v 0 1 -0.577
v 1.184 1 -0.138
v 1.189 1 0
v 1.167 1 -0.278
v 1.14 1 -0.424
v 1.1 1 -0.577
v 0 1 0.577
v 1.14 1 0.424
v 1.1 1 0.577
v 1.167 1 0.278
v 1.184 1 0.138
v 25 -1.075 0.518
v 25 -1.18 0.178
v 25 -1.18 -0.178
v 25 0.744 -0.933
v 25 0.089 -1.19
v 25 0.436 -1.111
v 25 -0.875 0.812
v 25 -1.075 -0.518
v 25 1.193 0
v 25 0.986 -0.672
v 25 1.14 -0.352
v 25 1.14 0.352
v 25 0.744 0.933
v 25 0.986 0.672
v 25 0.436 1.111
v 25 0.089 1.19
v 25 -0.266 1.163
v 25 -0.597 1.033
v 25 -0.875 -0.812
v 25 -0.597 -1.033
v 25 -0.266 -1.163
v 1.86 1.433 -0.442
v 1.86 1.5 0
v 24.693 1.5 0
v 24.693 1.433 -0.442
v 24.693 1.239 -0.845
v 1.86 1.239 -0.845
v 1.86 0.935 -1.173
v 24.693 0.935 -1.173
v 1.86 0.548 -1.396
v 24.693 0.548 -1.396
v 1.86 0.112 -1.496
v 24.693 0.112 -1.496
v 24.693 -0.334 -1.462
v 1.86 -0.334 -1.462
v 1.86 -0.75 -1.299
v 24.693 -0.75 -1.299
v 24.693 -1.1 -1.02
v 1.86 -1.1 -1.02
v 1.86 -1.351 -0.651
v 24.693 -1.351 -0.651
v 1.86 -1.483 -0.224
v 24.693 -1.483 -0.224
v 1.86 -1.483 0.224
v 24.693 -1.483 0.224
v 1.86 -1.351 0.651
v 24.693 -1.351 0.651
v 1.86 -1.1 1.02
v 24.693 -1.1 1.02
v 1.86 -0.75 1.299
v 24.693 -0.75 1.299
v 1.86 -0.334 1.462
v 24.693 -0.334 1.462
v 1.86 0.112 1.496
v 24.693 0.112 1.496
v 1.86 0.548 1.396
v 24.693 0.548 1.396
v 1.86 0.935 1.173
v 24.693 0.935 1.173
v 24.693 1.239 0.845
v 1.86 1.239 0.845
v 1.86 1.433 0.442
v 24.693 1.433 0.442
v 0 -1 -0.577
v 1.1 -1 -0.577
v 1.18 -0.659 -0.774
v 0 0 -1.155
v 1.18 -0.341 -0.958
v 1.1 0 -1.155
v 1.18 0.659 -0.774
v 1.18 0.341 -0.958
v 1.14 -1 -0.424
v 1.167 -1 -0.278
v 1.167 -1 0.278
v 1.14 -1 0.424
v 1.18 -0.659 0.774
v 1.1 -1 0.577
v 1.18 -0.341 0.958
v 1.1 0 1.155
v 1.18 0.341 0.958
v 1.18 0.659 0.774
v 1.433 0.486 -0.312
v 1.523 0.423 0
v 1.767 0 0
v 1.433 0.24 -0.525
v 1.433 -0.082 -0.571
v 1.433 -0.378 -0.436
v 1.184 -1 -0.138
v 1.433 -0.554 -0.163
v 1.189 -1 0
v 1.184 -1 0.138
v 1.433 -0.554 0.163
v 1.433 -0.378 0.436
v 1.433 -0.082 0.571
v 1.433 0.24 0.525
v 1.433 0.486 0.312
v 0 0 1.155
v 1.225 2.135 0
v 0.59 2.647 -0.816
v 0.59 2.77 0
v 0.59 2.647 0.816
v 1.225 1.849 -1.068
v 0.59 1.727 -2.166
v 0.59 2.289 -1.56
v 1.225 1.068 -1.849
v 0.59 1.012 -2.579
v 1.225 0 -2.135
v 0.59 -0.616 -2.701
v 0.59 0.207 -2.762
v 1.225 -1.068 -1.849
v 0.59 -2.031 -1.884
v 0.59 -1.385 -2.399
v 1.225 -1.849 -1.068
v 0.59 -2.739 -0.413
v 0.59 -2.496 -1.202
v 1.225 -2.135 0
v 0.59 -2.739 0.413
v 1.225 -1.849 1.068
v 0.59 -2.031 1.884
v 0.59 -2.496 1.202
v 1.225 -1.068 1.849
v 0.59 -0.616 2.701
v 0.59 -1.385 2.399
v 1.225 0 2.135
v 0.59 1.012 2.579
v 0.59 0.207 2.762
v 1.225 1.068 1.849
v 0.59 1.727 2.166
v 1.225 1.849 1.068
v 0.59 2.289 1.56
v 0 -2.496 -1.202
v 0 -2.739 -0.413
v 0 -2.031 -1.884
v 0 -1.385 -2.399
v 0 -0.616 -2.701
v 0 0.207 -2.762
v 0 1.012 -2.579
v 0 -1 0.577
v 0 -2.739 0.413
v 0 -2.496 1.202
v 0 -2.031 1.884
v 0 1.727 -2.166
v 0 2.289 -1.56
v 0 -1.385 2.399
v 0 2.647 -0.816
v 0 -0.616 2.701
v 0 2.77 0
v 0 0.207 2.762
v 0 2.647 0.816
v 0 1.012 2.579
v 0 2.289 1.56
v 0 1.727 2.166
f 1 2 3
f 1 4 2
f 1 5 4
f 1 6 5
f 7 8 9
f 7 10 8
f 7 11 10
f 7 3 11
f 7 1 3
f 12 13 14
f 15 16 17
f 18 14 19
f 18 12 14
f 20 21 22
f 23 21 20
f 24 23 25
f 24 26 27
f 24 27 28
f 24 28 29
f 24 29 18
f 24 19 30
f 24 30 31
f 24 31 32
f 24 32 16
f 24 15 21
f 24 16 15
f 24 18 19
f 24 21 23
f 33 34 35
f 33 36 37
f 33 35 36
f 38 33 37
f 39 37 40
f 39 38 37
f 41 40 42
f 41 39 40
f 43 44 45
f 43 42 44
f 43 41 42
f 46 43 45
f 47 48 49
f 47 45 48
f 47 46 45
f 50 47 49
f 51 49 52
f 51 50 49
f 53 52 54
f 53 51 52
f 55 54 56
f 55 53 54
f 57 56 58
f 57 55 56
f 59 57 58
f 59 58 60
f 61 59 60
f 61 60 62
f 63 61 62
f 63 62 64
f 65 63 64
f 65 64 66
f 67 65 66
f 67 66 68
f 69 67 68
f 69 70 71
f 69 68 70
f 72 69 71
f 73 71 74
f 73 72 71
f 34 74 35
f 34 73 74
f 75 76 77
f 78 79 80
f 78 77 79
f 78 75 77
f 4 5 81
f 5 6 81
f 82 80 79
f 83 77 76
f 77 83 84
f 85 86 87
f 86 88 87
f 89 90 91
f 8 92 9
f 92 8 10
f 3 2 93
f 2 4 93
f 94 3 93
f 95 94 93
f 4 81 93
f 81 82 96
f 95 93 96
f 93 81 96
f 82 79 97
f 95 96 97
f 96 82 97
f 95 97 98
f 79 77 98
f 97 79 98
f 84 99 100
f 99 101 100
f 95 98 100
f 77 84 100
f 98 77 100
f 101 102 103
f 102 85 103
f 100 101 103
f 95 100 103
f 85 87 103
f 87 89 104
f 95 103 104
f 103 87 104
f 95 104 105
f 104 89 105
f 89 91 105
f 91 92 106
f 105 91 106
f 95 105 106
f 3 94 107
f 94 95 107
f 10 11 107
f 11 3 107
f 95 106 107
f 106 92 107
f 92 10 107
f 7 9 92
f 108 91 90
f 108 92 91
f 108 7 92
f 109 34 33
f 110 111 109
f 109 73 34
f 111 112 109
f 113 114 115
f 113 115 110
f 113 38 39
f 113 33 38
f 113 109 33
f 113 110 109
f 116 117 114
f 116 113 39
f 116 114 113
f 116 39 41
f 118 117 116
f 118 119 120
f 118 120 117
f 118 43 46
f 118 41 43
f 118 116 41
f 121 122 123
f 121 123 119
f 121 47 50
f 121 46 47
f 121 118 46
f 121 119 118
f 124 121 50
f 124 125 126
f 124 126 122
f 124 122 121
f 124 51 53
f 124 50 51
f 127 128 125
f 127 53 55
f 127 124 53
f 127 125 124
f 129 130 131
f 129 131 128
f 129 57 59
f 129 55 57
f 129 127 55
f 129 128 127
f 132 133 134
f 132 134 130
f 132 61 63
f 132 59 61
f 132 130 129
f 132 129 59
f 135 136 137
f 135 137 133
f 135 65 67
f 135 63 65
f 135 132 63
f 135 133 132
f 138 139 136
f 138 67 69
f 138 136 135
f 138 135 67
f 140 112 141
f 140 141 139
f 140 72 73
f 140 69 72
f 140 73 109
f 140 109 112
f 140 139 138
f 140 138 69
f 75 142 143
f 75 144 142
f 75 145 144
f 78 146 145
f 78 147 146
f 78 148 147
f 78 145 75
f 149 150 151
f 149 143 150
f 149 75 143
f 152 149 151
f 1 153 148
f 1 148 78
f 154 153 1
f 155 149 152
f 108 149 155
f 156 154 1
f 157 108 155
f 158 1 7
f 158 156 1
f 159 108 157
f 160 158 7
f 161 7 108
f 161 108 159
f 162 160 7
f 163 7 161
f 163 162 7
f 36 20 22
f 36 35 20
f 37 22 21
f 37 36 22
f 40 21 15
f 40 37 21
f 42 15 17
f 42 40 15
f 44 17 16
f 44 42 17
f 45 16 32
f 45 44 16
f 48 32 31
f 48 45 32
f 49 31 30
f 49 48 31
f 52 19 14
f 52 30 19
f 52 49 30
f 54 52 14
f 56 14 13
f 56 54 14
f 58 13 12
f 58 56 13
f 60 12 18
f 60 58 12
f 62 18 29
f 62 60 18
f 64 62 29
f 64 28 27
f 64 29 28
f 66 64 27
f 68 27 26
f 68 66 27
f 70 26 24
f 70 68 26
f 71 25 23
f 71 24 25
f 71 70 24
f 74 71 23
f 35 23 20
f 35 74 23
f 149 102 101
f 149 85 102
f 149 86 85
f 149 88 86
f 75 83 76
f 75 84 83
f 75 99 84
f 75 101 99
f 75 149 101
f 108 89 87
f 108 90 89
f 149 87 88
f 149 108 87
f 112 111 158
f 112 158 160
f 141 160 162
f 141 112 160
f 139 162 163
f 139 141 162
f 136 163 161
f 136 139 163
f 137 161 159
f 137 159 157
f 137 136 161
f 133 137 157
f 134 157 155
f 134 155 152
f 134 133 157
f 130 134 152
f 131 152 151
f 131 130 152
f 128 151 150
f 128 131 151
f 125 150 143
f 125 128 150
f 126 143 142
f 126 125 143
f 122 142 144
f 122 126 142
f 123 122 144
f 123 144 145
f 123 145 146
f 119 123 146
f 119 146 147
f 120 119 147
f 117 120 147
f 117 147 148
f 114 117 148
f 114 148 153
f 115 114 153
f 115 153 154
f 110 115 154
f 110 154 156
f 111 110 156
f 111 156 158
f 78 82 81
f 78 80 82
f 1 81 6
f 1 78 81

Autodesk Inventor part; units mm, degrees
ref_plane "YZ Plane" through (0, 0, 0) normal (1, 0, 0) x (0, 1, 0)
ref_plane "XZ Plane" through (0, 0, 0) normal (0, 1, 0) x (-1, 0, 0)
sketch "Sketch1" plane through (0, 0, 0) normal (0, 0, 1) x (1, 0, 0)
  line L0 (25, 0) -> (25, 1.5)
  line L1 (25, 1.5) -> (3.36, 1.5)
  line L2 (3.36, 1.5) -> (3.0533, 1.5)
  line L3 (0, 2.77) -> (0, 1.1547)
  line L4 (0, 1.1547) -> (1.1, 1.1547)
  line L5 (1.1, 1.1547) -> (1.7667, 0)
  line L6 (1.7667, 0) -> (25, 0)
  line L7 (0, 2.77) -> (0.59, 2.77)
  line L8 (0.59, 2.77) -> (1.86, 1.5)
  line L9 (3.0533, 1.5) -> (1.86, 1.5)
  line L10 (3.36, 1.5) -> (1.86, 1.5) construction
  line L11 (1.86, 1.5) -> (1.86, 1.5)
  line L12 (-25.4, 0) -> (152.4, 0) projected
  line L13 (0, -2.1133) -> (0, 12.6797) projected
  dimension "d0" = 25
  dimension "d1" = 21.64
  dimension "d2" = 1.1
  dimension "d3" = 3
  dimension "d6" = 1.86
  dimension "d7" = 45
  dimension "d8" = 2.3094
  dimension "d9" = 60
  dimension "d10" = 5.54
  dimension "d11" = 3
  dimension "d12" = 0.3067
revolve "Body" add sketch "Sketch1" angle 360 about axis through (1.7667, 0, 0) along (1, 0, 0) contours L6 L5 L4 L3 L7 L8 L9 L2 L1 L0
sketch "Sketch2" plane through (0, 0, 0) normal (-1, 0, 0) x (0, 0, 1)
  circle A0 centre (0, 0) radius 1.1547 projected
  line L0 (0, -6.4055) -> (0, 6.4055) projected
  line L1 (-6.4055, 0) -> (6.4055, 0) projected
  line L2 (1.1547, 0) -> (0.5774, -1)
  line L3 (0.5774, -1) -> (-0.5774, -1)
  line L4 (-0.5774, -1) -> (-1.1547, 0)
  line L5 (-1.1547, 0) -> (-0.5774, 1)
  line L6 (-0.5774, 1) -> (0.5774, 1)
  line L7 (0.5774, 1) -> (1.1547, 0)
  point P0 (0, 1.1547)
extrude "Slot" add sketch "Sketch2" against normal up to next contours L7 A0 | A0 L2 | L6 L0 A0 | A0 L0 L3 | L0 L6 A0 | A0 L3 L0 | L4 A0 | A0 L5
thread "Thread" size "M14x2" class "6g" standard "ISO Metric profile" length 21.64
chamfer "Chamfer1" distance 0.3067 distance2 0.3067 1 edges at (25, -1.5, 0) measured on face at (25, 0.0871, 0.3876)
ref_plane "Work Plane1" through (104.775, 0, 0) normal (0, 0, -1) x (1, 0, 0)
equation "\"d15\" = GEL"
equation "\"d17\" = -0.5 * SPD + 0.5 * GD"
equation "\"d18\" = GUL"
equation "\"d0\" = NLG"
equation "\"d1\" = GEL"
equation "\"d2\" = INTI"
equation "\"d3\" = GD"
equation "\"d6\" = KOH"
equation "\"d7\" = 0.5 * SEWI"
equation "\"d8\" = 1.1547 * SW"
equation "\"d10\" = KOD"
equation "\"d11\" = BDM"
equation "\"d12\" = GAL"
equation "\"NLG\" = 25"
equation "\"INTI\" = 1.1"
equation "\"GEL\" = 21.64"
equation "\"GAL\" = 0.61345 * PTC"
equation "\"KOH\" = 1.86"
equation "\"KOD\" = 5.54"
equation "\"GUL\" = 0.61345 * PTC"
equation "\"SPD\" = NND - 1.2269 * PTC"
equation "\"BDM\" = NND"
equation "\"GD\" = NND"
equation "\"SEWI\" = 90deg"
equation "\"SW\" = 2"
equation "\"TOA\" = 30deg"
equation "\"GD1\" = THREADDIA - 1.2269 * PTC"
equation "\"EPV\" = 3.36"
equation "\"THREADDIA\" = 3"
equation "\"PTC\" = 0.5"
equation "\"NND\" = 3"
equation "\"E0\" = 2.31"
properties part number "ISO 10642  - M3  x  25" material "Steel"
